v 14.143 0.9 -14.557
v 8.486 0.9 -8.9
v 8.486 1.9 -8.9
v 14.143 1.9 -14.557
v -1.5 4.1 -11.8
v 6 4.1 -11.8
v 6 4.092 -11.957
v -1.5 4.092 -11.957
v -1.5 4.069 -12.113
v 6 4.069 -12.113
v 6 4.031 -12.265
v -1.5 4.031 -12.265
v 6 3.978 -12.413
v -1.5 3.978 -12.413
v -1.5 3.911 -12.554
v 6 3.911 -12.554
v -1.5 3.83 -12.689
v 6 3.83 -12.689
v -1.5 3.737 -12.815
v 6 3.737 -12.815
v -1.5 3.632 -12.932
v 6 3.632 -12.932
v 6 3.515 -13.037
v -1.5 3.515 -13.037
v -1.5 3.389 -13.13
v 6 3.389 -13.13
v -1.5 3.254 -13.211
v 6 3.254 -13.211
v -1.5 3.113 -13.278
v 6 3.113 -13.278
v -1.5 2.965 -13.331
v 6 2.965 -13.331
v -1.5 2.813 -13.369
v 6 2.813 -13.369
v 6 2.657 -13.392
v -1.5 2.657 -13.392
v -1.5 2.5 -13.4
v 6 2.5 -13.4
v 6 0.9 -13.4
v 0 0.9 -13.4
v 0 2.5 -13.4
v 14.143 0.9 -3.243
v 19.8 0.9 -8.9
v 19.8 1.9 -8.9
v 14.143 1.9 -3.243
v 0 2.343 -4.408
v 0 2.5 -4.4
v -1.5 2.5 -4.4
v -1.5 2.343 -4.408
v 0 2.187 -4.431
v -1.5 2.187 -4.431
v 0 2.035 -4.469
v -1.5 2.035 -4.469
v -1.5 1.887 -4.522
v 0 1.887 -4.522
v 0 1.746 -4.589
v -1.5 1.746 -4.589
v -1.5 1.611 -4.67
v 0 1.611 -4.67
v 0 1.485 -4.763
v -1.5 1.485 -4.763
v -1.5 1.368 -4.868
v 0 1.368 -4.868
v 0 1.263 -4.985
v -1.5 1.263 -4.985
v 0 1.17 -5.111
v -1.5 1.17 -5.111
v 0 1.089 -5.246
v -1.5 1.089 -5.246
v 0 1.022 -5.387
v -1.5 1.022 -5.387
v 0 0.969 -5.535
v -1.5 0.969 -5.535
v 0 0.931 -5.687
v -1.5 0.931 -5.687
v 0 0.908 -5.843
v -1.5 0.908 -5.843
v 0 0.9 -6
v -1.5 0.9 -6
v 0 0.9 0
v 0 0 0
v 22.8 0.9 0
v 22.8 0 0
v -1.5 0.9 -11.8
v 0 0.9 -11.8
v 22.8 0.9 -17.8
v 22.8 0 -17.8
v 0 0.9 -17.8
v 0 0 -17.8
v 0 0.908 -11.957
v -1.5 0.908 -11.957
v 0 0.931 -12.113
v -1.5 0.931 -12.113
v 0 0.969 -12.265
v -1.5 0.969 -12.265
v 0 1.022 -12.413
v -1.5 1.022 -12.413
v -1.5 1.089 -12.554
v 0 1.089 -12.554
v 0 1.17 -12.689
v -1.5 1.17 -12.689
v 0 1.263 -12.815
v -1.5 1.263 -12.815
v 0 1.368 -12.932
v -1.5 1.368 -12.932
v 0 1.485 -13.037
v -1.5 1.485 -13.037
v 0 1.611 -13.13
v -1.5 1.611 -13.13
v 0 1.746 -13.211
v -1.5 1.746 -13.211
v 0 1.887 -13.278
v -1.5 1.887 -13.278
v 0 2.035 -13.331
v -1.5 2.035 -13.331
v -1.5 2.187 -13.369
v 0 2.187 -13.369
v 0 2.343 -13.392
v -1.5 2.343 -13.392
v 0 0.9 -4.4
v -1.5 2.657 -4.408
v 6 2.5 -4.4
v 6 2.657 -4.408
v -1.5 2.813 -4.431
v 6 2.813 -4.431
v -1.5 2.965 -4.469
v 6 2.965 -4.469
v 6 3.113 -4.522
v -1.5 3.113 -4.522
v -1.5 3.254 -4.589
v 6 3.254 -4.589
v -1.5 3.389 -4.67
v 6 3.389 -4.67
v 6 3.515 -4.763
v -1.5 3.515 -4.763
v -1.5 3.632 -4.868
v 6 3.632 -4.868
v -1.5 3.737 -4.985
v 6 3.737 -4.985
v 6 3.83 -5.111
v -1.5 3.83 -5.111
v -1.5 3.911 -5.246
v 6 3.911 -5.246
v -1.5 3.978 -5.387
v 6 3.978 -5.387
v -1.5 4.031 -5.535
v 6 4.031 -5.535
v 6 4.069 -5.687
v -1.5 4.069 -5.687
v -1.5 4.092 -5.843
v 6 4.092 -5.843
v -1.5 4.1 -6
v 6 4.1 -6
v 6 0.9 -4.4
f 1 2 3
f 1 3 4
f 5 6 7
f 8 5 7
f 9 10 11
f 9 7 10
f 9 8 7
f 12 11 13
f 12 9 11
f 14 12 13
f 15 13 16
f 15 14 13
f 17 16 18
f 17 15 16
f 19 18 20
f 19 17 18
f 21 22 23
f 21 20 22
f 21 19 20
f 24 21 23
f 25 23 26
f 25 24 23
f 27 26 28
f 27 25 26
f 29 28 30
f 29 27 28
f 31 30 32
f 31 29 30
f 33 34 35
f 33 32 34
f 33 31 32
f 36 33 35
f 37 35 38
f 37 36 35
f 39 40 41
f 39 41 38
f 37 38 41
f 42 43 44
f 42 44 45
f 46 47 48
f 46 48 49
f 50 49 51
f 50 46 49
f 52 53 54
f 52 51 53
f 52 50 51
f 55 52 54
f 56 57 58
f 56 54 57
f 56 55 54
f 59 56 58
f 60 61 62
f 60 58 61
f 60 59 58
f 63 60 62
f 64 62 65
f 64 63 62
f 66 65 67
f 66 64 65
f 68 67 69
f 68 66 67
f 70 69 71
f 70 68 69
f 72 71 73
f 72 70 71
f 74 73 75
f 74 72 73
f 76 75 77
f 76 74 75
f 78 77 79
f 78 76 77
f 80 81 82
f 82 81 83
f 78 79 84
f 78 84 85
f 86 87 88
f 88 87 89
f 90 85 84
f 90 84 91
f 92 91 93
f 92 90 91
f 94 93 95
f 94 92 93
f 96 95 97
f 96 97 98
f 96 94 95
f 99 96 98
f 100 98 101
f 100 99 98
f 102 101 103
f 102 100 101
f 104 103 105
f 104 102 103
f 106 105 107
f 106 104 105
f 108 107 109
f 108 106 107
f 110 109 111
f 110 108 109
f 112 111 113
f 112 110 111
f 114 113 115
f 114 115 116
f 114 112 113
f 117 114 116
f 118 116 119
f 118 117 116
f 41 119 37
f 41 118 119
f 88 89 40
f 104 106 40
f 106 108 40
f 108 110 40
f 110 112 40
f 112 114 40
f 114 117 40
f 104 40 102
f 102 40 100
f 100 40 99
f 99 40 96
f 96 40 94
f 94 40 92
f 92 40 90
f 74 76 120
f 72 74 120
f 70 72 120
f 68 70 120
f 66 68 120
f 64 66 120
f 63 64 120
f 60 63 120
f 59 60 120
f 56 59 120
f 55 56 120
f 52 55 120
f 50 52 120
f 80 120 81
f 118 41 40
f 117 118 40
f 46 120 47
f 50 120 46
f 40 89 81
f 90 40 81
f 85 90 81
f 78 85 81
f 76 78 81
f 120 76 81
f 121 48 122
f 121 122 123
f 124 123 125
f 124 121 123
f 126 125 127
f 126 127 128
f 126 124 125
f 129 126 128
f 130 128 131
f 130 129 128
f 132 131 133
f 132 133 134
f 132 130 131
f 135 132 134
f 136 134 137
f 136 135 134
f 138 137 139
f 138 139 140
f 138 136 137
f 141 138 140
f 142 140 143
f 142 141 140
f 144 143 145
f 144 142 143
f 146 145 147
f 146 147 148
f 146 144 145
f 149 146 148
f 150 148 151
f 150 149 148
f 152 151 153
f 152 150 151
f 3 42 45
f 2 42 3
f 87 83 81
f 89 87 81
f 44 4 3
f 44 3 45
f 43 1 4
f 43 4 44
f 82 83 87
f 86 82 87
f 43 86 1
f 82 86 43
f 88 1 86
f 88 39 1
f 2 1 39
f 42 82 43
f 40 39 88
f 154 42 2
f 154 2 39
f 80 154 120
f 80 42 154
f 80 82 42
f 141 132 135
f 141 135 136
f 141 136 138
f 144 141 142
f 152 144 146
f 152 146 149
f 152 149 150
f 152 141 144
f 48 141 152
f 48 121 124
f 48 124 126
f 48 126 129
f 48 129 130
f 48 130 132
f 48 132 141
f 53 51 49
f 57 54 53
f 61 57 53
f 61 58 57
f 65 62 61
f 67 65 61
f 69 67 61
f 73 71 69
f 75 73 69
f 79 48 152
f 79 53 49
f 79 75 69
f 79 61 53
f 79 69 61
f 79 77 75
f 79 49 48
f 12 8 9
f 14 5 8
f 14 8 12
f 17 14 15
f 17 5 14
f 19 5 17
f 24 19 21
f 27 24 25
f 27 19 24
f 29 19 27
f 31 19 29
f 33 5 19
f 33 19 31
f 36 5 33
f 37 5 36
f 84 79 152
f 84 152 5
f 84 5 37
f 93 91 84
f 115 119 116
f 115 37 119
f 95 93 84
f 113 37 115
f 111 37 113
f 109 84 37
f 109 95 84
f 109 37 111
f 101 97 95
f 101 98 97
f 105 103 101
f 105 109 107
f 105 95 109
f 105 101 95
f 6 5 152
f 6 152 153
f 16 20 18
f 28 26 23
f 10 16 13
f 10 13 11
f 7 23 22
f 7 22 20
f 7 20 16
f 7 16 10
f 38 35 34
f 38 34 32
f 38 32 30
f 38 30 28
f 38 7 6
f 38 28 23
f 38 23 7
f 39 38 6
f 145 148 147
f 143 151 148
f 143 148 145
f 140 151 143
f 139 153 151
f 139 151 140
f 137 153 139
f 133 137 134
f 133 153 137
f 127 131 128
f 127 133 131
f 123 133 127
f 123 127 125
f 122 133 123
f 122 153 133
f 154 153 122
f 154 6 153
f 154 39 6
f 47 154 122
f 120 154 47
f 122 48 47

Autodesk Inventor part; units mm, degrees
ref_plane "YZ Plane" through (0, 0, 0) normal (1, 0, 0) x (0, 1, 0)
ref_plane "XZ Plane" through (0, 0, 0) normal (0, 1, 0) x (-1, 0, 0)
ref_plane "XY Plane" through (0, 0, 0) normal (0, 0, 1) x (1, 0, 0)
sketch "Sketch1" plane through (0, 0, 0) normal (0, 1, 0) x (-1, 0, 0)
  line L0 (0, 0) -> (-22.8, 0)
  line L1 (-22.8, 0) -> (-22.8, -17.8)
  line L2 (-22.8, -17.8) -> (0, -17.8)
  line L3 (0, -17.8) -> (0, 0)
  dimension "d0" = 22.8
  dimension "d1" = 17.8
extrude "Extrusion1" add sketch "Sketch1" along normal blind 0.9
sketch "Sketch2" plane through (0, 0.9, 0) normal (0, 1, 0) x (1, 0, 0)
  line L0 (14.1431, 3.2431) -> (8.4863, 8.9)
  line L1 (8.4863, 8.9) -> (14.1431, 14.5569)
  line L2 (14.1431, 14.5569) -> (19.8, 8.9)
  line L3 (19.8, 8.9) -> (14.1431, 3.2431)
  line L4 (22.8, 0) -> (22.8, 17.8) projected
  point P0 (0, 0)
  point P1 (22.8, 8.9)
  dimension "d4" = 135
  dimension "d5" = 8
  dimension "d6" = 3
extrude "Extrusion2" add sketch "Sketch2" along normal blind 1
sketch "Sketch3" plane through (0, 0.9, 0) normal (0, 1, 0) x (1, 0, 0)
  line L0 (6, 4.4) -> (-1.5, 4.4)
  line L1 (-1.5, 4.4) -> (-1.5, 13.4)
  line L2 (-1.5, 13.4) -> (6, 13.4)
  line L3 (6, 13.4) -> (6, 4.4)
  line L4 (0, 17.8) -> (0, 0) projected
  point P0 (-1.5, 8.9)
  point P1 (0, 8.9)
  dimension "d9" = 7.5
  dimension "d10" = 1.5
  dimension "d11" = 9
extrude "Extrusion3" add sketch "Sketch3" along normal blind 3.2
fillet "Fillet1" radius 1.6 4 edges at (2.25, 4.1, -4.4) (2.25, 4.1, -13.4) (-0.75, 0.9, -4.4) (-0.75, 0.9, -13.4)
properties part number "rp2040"
